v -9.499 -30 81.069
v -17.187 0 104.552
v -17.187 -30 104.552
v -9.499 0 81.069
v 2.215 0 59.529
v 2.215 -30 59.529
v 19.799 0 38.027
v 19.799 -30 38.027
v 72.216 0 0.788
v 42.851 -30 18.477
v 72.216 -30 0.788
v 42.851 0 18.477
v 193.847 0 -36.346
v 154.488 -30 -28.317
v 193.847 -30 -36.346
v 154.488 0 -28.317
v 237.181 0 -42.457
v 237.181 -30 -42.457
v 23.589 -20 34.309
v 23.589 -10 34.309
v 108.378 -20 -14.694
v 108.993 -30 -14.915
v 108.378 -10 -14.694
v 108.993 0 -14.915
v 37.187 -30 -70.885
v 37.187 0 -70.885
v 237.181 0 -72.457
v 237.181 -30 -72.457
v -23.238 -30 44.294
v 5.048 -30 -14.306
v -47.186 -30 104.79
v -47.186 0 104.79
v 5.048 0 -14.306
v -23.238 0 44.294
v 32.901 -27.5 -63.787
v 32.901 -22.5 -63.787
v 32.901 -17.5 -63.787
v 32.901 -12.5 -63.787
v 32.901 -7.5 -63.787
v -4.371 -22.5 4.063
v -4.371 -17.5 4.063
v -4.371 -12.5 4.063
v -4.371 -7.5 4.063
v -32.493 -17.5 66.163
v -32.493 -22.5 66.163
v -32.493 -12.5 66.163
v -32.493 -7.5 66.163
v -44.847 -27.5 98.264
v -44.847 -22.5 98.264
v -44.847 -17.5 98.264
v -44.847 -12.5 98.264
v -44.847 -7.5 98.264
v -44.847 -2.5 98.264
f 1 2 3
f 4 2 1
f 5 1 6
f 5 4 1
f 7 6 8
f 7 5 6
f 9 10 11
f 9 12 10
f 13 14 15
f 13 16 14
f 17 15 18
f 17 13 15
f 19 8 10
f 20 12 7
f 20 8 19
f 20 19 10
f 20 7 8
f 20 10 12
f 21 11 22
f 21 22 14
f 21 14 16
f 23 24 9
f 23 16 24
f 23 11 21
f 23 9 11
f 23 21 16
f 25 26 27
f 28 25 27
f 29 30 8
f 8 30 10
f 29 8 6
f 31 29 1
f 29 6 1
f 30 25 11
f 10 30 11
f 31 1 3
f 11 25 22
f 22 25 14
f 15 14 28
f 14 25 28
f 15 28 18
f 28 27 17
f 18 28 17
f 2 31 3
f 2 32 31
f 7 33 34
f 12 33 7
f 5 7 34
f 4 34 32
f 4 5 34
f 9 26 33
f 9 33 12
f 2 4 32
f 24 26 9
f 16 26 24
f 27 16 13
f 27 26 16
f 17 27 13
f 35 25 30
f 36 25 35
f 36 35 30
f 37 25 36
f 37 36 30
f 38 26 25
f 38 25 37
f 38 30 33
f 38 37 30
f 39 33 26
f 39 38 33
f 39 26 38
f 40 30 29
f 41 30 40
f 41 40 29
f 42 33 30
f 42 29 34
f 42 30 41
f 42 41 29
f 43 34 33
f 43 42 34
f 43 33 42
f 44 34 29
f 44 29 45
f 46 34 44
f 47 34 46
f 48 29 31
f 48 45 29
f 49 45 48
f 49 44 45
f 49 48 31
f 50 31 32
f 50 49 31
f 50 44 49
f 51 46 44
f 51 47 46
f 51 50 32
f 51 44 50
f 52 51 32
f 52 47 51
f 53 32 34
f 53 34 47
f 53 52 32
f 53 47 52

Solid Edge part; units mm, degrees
sketch "Sketch1" plane through (0, 0, 0) normal (0, -1, 0) x (1, 0, 0)
  line L0 (-47.1865, 104.7898) -> (-17.1874, 104.5518)
  spline S0 degree 3 poles (-17.1874, 104.5518) (1.5818, 23.6883) (86.3711, -25.3145) (237.1806, -42.4569) knots 0 0 0 0 1 1 1 1
  line L1 (237.1806, -72.4569) -> (237.1806, -42.4569)
  line L2 (37.1868, -70.8852) -> (237.1806, -72.4569)
  spline S1 degree 3 poles (37.1868, -70.8852) (35.6106, -68.2853) (32.2626, -62.7545) (27.2243, -54.2279) (20.8081, -43.1317) (13.5024, -30.1302) (4.5447, -13.4884) (-4.2846, 3.7332) (-13.3137, 22.3055) (-22.7748, 42.9587) (-32.0723, 64.8375) (-39.4331, 83.5739) (-44.3295, 96.7819) (-46.3335, 102.3952) (-47.1865, 104.7898) knots 0 0 0 0 0.042471 0.106651 0.148538 0.240307 0.335382 0.439066 0.537631 0.65264 0.788309 0.901943 0.964491 1 1 1 1
  dimension "D1" = 200
  dimension "D2" = 30
  dimension "D3" = 30
extrude "Protrusion1" add sketch "Sketch1" along normal blind 30
